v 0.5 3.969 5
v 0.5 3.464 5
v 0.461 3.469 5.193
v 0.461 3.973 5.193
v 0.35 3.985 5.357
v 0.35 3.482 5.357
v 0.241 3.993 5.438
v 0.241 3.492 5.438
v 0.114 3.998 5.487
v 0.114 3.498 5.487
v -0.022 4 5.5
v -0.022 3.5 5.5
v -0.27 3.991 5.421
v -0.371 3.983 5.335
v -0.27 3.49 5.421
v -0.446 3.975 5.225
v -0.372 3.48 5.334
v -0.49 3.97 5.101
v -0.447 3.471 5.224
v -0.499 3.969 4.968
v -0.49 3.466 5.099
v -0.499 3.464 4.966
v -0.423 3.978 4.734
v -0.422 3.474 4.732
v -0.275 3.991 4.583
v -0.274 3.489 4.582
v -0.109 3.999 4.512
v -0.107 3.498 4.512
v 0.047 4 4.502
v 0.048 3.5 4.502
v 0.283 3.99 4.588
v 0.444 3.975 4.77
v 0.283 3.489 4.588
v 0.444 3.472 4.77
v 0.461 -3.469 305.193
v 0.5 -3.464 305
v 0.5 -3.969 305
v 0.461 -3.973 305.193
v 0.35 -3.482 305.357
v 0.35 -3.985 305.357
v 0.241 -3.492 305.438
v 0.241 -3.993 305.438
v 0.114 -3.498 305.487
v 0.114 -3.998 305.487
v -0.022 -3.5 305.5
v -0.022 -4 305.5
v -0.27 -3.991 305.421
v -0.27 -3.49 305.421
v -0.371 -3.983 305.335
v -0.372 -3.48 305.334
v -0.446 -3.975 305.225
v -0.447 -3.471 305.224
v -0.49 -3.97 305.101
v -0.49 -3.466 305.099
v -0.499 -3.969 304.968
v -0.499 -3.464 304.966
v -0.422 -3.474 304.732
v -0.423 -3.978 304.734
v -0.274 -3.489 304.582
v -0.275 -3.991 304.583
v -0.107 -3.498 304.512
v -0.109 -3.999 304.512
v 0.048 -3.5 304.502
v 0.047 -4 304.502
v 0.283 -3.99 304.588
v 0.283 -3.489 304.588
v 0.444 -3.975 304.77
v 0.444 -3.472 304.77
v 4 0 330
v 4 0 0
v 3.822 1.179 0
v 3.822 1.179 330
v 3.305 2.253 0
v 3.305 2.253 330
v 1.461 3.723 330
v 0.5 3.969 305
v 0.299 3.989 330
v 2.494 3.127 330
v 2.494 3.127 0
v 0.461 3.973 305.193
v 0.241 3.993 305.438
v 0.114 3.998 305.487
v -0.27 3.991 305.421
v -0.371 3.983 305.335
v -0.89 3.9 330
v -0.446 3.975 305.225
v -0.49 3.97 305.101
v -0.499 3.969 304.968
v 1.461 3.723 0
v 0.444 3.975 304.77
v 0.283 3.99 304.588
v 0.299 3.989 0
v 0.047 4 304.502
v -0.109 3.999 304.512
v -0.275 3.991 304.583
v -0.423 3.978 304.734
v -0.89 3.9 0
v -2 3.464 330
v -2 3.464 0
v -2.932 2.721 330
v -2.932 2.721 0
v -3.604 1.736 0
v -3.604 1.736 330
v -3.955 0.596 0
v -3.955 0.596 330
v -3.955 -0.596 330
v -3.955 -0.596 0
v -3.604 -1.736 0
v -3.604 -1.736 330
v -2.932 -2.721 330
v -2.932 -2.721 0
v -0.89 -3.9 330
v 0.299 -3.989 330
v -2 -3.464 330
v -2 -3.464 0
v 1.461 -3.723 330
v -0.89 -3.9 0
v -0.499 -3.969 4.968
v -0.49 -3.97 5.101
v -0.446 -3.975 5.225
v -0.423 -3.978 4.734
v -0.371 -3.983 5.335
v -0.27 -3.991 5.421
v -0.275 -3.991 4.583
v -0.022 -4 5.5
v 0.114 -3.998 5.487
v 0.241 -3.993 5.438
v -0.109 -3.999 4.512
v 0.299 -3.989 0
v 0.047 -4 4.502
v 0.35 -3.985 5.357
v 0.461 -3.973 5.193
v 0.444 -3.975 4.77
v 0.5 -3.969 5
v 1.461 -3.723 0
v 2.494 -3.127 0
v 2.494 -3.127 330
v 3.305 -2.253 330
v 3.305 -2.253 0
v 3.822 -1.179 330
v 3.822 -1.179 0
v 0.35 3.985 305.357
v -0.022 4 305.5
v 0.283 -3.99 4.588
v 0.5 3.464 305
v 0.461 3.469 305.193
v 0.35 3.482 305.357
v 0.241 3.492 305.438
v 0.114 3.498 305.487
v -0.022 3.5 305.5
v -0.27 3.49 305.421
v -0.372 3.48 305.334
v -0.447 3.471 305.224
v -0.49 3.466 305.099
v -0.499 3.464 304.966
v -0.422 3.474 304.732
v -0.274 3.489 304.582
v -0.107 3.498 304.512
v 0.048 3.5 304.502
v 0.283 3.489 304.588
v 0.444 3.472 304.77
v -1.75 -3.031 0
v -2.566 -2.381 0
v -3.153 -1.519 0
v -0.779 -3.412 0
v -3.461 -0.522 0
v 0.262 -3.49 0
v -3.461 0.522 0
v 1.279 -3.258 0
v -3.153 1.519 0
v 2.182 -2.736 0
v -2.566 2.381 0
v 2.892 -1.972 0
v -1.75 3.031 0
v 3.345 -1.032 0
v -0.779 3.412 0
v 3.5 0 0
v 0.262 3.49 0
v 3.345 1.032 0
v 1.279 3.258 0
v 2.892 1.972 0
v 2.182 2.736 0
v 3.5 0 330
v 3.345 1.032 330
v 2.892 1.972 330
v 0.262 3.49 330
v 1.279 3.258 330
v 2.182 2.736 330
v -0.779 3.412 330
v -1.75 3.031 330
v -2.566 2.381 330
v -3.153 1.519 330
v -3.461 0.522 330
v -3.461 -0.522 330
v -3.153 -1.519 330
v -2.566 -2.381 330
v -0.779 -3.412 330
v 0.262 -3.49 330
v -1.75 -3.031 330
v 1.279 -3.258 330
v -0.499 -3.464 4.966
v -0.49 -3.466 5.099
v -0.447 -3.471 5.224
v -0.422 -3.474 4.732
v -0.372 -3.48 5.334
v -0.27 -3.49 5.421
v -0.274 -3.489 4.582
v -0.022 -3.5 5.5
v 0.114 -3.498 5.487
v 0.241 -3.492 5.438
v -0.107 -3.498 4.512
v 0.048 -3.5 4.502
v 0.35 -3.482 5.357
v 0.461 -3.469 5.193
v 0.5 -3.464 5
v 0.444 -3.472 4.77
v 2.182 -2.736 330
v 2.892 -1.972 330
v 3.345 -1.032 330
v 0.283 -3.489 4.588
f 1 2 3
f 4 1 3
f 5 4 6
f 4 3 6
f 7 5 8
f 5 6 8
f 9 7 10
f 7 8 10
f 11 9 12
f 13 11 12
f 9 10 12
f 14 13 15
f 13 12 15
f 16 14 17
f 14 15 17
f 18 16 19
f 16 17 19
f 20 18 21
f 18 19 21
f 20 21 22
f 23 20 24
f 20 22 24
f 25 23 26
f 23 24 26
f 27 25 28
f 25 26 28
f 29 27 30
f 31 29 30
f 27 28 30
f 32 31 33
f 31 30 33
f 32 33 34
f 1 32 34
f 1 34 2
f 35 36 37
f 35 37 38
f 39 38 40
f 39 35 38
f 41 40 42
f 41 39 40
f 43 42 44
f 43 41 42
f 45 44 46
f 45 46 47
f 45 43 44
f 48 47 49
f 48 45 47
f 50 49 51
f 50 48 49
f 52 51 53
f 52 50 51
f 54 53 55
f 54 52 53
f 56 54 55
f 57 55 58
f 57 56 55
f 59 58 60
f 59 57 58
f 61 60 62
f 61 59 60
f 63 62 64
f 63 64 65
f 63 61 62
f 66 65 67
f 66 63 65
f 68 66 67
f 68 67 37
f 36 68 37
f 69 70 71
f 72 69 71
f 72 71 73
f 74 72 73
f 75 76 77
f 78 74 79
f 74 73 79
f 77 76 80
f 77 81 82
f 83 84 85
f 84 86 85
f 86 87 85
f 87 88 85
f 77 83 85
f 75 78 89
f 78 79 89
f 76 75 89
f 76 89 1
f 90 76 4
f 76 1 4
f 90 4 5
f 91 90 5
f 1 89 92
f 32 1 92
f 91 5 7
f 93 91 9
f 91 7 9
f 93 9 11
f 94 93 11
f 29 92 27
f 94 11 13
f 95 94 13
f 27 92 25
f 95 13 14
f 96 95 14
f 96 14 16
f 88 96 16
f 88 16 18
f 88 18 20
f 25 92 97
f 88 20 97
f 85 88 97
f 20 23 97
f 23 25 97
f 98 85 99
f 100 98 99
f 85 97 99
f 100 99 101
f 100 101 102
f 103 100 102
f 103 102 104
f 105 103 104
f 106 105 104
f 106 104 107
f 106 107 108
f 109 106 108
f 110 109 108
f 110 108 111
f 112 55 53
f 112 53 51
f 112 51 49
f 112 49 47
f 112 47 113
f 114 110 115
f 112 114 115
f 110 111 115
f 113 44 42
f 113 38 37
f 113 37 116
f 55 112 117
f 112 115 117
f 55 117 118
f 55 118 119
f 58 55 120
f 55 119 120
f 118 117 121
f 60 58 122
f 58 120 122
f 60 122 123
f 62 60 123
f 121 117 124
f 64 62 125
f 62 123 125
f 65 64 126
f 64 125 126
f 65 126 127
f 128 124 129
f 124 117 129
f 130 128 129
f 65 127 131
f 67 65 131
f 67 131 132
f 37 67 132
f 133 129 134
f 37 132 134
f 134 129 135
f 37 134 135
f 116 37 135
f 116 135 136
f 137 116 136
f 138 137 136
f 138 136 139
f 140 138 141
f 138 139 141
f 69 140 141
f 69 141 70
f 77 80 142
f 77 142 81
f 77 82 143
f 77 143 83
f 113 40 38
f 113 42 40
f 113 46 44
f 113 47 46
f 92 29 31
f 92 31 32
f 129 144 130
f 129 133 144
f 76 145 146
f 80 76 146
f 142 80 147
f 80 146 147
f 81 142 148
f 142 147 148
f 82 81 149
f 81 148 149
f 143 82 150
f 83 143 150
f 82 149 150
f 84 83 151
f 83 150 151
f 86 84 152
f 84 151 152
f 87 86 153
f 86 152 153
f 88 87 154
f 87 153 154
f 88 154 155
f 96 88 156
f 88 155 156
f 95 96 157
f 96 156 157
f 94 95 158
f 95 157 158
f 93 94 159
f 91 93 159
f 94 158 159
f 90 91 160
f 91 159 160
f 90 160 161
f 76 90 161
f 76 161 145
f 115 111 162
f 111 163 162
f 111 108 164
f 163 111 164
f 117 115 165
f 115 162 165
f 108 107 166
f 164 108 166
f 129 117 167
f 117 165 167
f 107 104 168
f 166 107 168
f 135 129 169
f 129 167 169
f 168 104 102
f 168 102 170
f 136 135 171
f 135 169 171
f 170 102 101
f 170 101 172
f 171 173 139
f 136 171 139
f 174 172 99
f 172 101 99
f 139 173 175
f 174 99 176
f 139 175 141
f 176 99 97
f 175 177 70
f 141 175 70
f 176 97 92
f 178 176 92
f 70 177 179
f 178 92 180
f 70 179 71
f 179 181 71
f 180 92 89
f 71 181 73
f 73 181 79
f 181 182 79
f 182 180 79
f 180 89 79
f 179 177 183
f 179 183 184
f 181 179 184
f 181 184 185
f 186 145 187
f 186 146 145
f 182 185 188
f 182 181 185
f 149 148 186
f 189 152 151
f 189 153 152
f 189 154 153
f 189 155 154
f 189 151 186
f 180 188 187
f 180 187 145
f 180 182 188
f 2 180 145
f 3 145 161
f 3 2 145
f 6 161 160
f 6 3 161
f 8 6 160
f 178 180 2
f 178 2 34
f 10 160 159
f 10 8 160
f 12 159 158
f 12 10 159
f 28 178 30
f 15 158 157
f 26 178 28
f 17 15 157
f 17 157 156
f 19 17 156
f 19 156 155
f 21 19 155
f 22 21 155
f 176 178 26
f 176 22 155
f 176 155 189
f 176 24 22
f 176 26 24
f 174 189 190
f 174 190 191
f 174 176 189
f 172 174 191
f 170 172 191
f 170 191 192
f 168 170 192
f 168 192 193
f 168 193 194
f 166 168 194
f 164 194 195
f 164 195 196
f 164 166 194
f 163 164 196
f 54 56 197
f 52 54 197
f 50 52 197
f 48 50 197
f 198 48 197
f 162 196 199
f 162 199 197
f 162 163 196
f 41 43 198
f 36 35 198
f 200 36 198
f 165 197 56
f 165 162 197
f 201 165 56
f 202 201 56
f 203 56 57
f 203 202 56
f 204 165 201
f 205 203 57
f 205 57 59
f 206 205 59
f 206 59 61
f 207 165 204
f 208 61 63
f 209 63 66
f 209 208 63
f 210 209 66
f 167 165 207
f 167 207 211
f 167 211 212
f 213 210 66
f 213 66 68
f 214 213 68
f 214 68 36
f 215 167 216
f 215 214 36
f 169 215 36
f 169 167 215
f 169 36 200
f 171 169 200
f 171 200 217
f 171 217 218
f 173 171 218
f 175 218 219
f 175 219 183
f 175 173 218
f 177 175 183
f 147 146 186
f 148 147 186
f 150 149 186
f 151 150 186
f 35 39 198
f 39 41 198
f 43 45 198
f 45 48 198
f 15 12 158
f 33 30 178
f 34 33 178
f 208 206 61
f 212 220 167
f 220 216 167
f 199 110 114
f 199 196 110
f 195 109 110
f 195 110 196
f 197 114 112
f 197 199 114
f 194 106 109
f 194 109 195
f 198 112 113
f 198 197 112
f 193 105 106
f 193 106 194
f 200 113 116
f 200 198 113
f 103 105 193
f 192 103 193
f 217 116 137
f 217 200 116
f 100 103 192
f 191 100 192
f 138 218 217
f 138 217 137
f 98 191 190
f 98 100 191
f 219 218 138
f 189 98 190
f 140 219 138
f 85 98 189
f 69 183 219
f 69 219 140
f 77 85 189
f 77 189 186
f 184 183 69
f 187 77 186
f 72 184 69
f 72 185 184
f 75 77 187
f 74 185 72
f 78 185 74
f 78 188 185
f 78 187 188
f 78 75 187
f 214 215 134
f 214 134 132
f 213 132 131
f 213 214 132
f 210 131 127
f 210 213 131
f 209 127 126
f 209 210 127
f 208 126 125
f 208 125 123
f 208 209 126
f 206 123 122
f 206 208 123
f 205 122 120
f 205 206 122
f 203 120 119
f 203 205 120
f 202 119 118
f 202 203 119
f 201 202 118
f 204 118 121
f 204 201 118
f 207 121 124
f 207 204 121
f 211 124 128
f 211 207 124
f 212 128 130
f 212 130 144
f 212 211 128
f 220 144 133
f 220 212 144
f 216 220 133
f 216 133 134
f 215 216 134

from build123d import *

# Parameters (mm, degrees)
F0_R          = 4
F0_R_2        = 3.5
F1_DEPTH      = 330
F2_R          = 0.5
F3_DEPTH      = 4.001
F3_DEPTH_BACK = 25


with BuildPart() as f1:
    # F0 (on Top) → F1 (new body)
    with BuildSketch(Plane.XY):
        Circle(F0_R)
        Circle(F0_R_2, mode=Mode.SUBTRACT)
    extrude(amount=F1_DEPTH)

    # F2 (on Front) → F3 (cut, two sides)
    with BuildSketch(Plane.XZ) as f3_sk:
        with Locations((0, 5)):
            Circle(F2_R)
        with Locations((0, 305)):
            Circle(F2_R)
    extrude(amount=-F3_DEPTH, mode=Mode.SUBTRACT)
    extrude(f3_sk.sketch, amount=F3_DEPTH_BACK, mode=Mode.SUBTRACT)


solid = f1.part
